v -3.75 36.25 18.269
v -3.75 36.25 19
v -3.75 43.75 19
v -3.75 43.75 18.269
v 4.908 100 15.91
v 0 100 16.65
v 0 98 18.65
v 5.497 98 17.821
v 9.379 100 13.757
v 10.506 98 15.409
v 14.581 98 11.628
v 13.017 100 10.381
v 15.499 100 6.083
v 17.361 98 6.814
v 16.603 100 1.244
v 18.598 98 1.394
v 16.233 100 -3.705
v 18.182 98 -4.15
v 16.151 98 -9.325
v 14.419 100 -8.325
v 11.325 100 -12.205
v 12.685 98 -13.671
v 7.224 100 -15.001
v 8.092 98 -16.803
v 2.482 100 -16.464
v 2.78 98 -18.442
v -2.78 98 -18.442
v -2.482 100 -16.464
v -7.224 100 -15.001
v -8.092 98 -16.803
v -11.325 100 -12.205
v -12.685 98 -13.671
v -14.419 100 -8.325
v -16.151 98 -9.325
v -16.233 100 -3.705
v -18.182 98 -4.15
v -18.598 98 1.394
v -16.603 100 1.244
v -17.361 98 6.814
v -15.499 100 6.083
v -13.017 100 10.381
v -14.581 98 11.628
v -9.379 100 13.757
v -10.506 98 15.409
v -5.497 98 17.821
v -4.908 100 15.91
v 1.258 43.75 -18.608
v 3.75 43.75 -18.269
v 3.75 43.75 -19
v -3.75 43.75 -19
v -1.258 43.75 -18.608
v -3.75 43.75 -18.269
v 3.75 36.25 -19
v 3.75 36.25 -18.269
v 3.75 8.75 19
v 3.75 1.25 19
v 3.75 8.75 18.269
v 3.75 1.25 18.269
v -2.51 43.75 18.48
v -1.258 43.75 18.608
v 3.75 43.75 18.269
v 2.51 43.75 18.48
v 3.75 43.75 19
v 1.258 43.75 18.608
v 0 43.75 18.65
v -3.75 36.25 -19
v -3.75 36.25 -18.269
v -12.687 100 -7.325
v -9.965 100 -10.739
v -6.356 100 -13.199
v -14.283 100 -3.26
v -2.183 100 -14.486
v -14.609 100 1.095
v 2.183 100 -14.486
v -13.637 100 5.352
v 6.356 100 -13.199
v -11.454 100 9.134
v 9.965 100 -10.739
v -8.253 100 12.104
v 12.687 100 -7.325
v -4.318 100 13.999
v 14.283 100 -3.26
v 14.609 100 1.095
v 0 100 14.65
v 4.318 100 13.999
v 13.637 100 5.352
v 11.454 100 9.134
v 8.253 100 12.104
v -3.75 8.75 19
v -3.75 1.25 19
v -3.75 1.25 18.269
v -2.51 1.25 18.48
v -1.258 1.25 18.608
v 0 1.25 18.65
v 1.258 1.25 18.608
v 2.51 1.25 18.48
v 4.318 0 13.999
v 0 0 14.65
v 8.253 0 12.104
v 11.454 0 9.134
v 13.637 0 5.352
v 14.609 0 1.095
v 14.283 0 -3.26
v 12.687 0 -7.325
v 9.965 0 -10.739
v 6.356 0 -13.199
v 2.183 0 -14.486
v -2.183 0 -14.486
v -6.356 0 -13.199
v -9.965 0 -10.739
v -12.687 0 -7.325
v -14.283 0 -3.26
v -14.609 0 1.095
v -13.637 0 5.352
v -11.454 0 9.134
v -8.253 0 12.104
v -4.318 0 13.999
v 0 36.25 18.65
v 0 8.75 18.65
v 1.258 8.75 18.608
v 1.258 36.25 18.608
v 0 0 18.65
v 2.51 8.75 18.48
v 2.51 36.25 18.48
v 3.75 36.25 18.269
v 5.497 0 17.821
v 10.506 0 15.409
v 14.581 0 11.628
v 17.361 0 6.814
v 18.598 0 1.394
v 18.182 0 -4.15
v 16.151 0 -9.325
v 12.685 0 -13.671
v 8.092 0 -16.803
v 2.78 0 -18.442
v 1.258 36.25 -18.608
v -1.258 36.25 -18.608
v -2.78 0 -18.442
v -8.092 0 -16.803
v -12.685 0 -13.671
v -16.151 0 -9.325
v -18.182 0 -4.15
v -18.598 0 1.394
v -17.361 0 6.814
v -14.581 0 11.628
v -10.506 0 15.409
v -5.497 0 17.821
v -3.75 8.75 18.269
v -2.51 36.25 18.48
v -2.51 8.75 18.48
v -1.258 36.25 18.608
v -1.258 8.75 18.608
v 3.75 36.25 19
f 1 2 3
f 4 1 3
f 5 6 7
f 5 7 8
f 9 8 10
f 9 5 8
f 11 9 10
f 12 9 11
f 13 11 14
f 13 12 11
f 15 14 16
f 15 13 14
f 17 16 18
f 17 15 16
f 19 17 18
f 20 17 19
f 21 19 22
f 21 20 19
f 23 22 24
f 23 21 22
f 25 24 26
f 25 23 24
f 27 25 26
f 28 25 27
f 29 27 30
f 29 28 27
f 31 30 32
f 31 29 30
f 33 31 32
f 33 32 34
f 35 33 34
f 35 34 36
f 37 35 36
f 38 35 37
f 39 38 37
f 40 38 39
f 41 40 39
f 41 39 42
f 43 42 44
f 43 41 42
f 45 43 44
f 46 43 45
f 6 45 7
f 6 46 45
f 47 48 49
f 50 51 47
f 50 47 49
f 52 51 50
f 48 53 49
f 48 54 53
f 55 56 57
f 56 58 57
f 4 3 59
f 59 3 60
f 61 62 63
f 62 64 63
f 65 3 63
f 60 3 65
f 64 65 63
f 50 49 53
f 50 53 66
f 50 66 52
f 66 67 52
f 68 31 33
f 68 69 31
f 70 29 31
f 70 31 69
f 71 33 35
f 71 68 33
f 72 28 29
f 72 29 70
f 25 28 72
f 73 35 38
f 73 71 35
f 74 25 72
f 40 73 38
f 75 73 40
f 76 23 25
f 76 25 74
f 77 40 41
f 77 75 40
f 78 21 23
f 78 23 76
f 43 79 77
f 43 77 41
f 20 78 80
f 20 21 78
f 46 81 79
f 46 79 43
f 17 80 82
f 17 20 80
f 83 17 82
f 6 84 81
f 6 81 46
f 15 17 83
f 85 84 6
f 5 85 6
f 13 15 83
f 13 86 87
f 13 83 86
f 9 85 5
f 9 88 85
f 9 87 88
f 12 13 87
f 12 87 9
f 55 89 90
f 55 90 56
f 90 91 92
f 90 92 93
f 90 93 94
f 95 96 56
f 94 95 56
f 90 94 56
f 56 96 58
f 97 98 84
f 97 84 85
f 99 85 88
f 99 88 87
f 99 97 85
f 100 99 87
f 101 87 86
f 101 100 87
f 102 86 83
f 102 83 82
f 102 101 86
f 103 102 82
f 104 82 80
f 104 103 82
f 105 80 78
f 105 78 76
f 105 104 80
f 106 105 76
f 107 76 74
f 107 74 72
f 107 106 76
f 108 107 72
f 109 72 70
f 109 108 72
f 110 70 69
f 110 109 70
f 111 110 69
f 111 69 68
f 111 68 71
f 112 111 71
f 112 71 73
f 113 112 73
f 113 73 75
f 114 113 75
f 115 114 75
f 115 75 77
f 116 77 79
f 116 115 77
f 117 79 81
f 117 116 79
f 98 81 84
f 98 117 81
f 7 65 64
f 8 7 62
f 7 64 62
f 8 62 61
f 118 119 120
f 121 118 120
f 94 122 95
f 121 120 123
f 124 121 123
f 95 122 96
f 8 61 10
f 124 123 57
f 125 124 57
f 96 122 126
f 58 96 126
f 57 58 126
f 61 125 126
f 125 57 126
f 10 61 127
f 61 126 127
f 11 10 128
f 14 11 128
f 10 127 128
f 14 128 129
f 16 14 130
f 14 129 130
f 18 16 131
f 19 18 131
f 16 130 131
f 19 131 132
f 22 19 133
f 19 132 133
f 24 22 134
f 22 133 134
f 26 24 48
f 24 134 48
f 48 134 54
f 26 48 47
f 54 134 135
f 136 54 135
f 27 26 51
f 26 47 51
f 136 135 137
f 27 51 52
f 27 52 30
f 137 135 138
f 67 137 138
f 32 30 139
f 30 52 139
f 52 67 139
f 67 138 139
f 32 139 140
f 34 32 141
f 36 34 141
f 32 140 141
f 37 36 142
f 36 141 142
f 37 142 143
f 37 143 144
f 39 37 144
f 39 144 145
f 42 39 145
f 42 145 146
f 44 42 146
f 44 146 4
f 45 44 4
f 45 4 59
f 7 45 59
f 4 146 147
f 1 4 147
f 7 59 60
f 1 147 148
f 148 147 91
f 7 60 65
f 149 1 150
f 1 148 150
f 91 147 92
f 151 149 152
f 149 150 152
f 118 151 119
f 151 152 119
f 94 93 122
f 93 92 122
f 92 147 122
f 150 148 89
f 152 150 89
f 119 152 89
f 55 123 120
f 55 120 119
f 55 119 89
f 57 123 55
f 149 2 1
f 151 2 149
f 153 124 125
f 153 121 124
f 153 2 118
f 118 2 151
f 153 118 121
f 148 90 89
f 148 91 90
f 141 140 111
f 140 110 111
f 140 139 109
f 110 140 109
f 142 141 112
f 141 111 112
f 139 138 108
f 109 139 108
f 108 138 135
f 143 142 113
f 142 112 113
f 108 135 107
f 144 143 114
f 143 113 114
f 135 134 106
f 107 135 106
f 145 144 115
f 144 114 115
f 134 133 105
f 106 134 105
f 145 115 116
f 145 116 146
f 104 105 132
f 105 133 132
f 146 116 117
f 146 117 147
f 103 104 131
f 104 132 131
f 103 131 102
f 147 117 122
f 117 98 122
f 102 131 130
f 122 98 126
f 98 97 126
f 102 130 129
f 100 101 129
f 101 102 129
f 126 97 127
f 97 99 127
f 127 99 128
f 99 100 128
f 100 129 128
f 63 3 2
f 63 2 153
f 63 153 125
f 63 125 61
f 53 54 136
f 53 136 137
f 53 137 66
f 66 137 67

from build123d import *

# Parameters (mm, degrees)
SKETCH1_R                       = 18.65
SKETCH1_R_2                     = 14.65
BOSS_EXTRUDE1_DEPTH             = 100
BOSS_EXTRUDE2_REACH             = 110.347
BOSS_EXTRUDE2_END_RADIUS        = 18.65
SKETCH3_W                       = 7.5
SKETCH3_H                       = 7.5
BOSS_EXTRUDE2_DIRECTION_2_DEPTH = 0.35
BOSS_EXTRUDE3_REACH             = 110.468
BOSS_EXTRUDE3_END_RADIUS        = 18.65
SKETCH4_W                       = 7.5
SKETCH4_H                       = 7.5
BOSS_EXTRUDE3_DIRECTION_2_DEPTH = 0.35
CHAMFER1_SIZE                   = 2


with BuildPart() as part:
    # Sketch1 → Boss-Extrude1 (new body)
    with BuildSketch(Plane(origin=(0, 0, 0), x_dir=(1, 0, 0), z_dir=(0, 1, 0))):
        Circle(SKETCH1_R)
        Circle(SKETCH1_R_2, mode=Mode.SUBTRACT)
    extrude(amount=BOSS_EXTRUDE1_DEPTH)

    # Boss-Extrude2: up to this cylinder (the profile starts outside it)
    boss_extrude2_end = Plane(origin=(0, 22.5, 0), z_dir=(0, -1, 0)) * Cylinder(BOSS_EXTRUDE2_END_RADIUS, 293.994, mode=Mode.PRIVATE)
    # Sketch3 → Boss-Extrude2 (add, up to the surface)
    with BuildSketch(Plane.XY.offset(18.65), mode=Mode.PRIVATE) as boss_extrude2_sk1:
        with Locations((0, 5)):
            Rectangle(SKETCH3_W, SKETCH3_H)
    boss_extrude2_tool1 = extrude(boss_extrude2_sk1.sketch, amount=-BOSS_EXTRUDE2_REACH, mode=Mode.PRIVATE) - boss_extrude2_end
    add(boss_extrude2_tool1.solids().sort_by_distance((0, 5, 18.65))[0])
    add(boss_extrude2_tool1.solids().sort_by_distance((0, 5, 18.65))[1])
    # Sketch3 → Boss-Extrude2 (add, up to the surface)
    with BuildSketch(Plane.XY.offset(18.65), mode=Mode.PRIVATE) as boss_extrude2_sk2:
        with Locations((0, 40)):
            Rectangle(SKETCH3_W, SKETCH3_H)
    boss_extrude2_tool2 = extrude(boss_extrude2_sk2.sketch, amount=-BOSS_EXTRUDE2_REACH, mode=Mode.PRIVATE) - boss_extrude2_end
    add(boss_extrude2_tool2.solids().sort_by_distance((0, 40, 18.65))[0])
    add(boss_extrude2_tool2.solids().sort_by_distance((0, 40, 18.65))[1])

    # Sketch3 → Boss-Extrude2 direction 2 (add)
    with BuildSketch(Plane.XY.offset(18.65)):
        with Locations((0, 5)):
            Rectangle(SKETCH3_W, SKETCH3_H)
        with Locations((0, 40)):
            Rectangle(SKETCH3_W, SKETCH3_H)
    extrude(amount=BOSS_EXTRUDE2_DIRECTION_2_DEPTH)

    # Boss-Extrude3: up to this cylinder (the profile starts outside it)
    boss_extrude3_end = Plane(origin=(0, 40, 0), z_dir=(0, -1, 0)) * Cylinder(BOSS_EXTRUDE3_END_RADIUS, 259.236, mode=Mode.PRIVATE)
    # Sketch4 → Boss-Extrude3 (add, up to the surface)
    with BuildSketch(Plane(origin=(0, 0, -18.65), x_dir=(-1, 0, 0), z_dir=(0, 0, -1)), mode=Mode.PRIVATE) as boss_extrude3_sk1:
        with Locations((0, 40)):
            Rectangle(SKETCH4_W, SKETCH4_H)
    boss_extrude3_tool1 = extrude(boss_extrude3_sk1.sketch, amount=-BOSS_EXTRUDE3_REACH, mode=Mode.PRIVATE) - boss_extrude3_end
    add(boss_extrude3_tool1.solids().sort_by_distance((0, 40, -18.65))[0])
    add(boss_extrude3_tool1.solids().sort_by_distance((0, 40, -18.65))[1])

    # Sketch4 → Boss-Extrude3 direction 2 (add)
    with BuildSketch(Plane(origin=(0, 0, -18.65), x_dir=(-1, 0, 0), z_dir=(0, 0, -1))):
        with Locations((0, 40)):
            Rectangle(SKETCH4_W, SKETCH4_H)
    extrude(amount=BOSS_EXTRUDE3_DIRECTION_2_DEPTH)

    # Chamfer1
    chamfer1_edges = [part.edges().sort_by_distance(p)[0] for p in [
        (-18.65, 100, 0),
    ]]
    chamfer(chamfer1_edges, length=CHAMFER1_SIZE)


solid = part.part
